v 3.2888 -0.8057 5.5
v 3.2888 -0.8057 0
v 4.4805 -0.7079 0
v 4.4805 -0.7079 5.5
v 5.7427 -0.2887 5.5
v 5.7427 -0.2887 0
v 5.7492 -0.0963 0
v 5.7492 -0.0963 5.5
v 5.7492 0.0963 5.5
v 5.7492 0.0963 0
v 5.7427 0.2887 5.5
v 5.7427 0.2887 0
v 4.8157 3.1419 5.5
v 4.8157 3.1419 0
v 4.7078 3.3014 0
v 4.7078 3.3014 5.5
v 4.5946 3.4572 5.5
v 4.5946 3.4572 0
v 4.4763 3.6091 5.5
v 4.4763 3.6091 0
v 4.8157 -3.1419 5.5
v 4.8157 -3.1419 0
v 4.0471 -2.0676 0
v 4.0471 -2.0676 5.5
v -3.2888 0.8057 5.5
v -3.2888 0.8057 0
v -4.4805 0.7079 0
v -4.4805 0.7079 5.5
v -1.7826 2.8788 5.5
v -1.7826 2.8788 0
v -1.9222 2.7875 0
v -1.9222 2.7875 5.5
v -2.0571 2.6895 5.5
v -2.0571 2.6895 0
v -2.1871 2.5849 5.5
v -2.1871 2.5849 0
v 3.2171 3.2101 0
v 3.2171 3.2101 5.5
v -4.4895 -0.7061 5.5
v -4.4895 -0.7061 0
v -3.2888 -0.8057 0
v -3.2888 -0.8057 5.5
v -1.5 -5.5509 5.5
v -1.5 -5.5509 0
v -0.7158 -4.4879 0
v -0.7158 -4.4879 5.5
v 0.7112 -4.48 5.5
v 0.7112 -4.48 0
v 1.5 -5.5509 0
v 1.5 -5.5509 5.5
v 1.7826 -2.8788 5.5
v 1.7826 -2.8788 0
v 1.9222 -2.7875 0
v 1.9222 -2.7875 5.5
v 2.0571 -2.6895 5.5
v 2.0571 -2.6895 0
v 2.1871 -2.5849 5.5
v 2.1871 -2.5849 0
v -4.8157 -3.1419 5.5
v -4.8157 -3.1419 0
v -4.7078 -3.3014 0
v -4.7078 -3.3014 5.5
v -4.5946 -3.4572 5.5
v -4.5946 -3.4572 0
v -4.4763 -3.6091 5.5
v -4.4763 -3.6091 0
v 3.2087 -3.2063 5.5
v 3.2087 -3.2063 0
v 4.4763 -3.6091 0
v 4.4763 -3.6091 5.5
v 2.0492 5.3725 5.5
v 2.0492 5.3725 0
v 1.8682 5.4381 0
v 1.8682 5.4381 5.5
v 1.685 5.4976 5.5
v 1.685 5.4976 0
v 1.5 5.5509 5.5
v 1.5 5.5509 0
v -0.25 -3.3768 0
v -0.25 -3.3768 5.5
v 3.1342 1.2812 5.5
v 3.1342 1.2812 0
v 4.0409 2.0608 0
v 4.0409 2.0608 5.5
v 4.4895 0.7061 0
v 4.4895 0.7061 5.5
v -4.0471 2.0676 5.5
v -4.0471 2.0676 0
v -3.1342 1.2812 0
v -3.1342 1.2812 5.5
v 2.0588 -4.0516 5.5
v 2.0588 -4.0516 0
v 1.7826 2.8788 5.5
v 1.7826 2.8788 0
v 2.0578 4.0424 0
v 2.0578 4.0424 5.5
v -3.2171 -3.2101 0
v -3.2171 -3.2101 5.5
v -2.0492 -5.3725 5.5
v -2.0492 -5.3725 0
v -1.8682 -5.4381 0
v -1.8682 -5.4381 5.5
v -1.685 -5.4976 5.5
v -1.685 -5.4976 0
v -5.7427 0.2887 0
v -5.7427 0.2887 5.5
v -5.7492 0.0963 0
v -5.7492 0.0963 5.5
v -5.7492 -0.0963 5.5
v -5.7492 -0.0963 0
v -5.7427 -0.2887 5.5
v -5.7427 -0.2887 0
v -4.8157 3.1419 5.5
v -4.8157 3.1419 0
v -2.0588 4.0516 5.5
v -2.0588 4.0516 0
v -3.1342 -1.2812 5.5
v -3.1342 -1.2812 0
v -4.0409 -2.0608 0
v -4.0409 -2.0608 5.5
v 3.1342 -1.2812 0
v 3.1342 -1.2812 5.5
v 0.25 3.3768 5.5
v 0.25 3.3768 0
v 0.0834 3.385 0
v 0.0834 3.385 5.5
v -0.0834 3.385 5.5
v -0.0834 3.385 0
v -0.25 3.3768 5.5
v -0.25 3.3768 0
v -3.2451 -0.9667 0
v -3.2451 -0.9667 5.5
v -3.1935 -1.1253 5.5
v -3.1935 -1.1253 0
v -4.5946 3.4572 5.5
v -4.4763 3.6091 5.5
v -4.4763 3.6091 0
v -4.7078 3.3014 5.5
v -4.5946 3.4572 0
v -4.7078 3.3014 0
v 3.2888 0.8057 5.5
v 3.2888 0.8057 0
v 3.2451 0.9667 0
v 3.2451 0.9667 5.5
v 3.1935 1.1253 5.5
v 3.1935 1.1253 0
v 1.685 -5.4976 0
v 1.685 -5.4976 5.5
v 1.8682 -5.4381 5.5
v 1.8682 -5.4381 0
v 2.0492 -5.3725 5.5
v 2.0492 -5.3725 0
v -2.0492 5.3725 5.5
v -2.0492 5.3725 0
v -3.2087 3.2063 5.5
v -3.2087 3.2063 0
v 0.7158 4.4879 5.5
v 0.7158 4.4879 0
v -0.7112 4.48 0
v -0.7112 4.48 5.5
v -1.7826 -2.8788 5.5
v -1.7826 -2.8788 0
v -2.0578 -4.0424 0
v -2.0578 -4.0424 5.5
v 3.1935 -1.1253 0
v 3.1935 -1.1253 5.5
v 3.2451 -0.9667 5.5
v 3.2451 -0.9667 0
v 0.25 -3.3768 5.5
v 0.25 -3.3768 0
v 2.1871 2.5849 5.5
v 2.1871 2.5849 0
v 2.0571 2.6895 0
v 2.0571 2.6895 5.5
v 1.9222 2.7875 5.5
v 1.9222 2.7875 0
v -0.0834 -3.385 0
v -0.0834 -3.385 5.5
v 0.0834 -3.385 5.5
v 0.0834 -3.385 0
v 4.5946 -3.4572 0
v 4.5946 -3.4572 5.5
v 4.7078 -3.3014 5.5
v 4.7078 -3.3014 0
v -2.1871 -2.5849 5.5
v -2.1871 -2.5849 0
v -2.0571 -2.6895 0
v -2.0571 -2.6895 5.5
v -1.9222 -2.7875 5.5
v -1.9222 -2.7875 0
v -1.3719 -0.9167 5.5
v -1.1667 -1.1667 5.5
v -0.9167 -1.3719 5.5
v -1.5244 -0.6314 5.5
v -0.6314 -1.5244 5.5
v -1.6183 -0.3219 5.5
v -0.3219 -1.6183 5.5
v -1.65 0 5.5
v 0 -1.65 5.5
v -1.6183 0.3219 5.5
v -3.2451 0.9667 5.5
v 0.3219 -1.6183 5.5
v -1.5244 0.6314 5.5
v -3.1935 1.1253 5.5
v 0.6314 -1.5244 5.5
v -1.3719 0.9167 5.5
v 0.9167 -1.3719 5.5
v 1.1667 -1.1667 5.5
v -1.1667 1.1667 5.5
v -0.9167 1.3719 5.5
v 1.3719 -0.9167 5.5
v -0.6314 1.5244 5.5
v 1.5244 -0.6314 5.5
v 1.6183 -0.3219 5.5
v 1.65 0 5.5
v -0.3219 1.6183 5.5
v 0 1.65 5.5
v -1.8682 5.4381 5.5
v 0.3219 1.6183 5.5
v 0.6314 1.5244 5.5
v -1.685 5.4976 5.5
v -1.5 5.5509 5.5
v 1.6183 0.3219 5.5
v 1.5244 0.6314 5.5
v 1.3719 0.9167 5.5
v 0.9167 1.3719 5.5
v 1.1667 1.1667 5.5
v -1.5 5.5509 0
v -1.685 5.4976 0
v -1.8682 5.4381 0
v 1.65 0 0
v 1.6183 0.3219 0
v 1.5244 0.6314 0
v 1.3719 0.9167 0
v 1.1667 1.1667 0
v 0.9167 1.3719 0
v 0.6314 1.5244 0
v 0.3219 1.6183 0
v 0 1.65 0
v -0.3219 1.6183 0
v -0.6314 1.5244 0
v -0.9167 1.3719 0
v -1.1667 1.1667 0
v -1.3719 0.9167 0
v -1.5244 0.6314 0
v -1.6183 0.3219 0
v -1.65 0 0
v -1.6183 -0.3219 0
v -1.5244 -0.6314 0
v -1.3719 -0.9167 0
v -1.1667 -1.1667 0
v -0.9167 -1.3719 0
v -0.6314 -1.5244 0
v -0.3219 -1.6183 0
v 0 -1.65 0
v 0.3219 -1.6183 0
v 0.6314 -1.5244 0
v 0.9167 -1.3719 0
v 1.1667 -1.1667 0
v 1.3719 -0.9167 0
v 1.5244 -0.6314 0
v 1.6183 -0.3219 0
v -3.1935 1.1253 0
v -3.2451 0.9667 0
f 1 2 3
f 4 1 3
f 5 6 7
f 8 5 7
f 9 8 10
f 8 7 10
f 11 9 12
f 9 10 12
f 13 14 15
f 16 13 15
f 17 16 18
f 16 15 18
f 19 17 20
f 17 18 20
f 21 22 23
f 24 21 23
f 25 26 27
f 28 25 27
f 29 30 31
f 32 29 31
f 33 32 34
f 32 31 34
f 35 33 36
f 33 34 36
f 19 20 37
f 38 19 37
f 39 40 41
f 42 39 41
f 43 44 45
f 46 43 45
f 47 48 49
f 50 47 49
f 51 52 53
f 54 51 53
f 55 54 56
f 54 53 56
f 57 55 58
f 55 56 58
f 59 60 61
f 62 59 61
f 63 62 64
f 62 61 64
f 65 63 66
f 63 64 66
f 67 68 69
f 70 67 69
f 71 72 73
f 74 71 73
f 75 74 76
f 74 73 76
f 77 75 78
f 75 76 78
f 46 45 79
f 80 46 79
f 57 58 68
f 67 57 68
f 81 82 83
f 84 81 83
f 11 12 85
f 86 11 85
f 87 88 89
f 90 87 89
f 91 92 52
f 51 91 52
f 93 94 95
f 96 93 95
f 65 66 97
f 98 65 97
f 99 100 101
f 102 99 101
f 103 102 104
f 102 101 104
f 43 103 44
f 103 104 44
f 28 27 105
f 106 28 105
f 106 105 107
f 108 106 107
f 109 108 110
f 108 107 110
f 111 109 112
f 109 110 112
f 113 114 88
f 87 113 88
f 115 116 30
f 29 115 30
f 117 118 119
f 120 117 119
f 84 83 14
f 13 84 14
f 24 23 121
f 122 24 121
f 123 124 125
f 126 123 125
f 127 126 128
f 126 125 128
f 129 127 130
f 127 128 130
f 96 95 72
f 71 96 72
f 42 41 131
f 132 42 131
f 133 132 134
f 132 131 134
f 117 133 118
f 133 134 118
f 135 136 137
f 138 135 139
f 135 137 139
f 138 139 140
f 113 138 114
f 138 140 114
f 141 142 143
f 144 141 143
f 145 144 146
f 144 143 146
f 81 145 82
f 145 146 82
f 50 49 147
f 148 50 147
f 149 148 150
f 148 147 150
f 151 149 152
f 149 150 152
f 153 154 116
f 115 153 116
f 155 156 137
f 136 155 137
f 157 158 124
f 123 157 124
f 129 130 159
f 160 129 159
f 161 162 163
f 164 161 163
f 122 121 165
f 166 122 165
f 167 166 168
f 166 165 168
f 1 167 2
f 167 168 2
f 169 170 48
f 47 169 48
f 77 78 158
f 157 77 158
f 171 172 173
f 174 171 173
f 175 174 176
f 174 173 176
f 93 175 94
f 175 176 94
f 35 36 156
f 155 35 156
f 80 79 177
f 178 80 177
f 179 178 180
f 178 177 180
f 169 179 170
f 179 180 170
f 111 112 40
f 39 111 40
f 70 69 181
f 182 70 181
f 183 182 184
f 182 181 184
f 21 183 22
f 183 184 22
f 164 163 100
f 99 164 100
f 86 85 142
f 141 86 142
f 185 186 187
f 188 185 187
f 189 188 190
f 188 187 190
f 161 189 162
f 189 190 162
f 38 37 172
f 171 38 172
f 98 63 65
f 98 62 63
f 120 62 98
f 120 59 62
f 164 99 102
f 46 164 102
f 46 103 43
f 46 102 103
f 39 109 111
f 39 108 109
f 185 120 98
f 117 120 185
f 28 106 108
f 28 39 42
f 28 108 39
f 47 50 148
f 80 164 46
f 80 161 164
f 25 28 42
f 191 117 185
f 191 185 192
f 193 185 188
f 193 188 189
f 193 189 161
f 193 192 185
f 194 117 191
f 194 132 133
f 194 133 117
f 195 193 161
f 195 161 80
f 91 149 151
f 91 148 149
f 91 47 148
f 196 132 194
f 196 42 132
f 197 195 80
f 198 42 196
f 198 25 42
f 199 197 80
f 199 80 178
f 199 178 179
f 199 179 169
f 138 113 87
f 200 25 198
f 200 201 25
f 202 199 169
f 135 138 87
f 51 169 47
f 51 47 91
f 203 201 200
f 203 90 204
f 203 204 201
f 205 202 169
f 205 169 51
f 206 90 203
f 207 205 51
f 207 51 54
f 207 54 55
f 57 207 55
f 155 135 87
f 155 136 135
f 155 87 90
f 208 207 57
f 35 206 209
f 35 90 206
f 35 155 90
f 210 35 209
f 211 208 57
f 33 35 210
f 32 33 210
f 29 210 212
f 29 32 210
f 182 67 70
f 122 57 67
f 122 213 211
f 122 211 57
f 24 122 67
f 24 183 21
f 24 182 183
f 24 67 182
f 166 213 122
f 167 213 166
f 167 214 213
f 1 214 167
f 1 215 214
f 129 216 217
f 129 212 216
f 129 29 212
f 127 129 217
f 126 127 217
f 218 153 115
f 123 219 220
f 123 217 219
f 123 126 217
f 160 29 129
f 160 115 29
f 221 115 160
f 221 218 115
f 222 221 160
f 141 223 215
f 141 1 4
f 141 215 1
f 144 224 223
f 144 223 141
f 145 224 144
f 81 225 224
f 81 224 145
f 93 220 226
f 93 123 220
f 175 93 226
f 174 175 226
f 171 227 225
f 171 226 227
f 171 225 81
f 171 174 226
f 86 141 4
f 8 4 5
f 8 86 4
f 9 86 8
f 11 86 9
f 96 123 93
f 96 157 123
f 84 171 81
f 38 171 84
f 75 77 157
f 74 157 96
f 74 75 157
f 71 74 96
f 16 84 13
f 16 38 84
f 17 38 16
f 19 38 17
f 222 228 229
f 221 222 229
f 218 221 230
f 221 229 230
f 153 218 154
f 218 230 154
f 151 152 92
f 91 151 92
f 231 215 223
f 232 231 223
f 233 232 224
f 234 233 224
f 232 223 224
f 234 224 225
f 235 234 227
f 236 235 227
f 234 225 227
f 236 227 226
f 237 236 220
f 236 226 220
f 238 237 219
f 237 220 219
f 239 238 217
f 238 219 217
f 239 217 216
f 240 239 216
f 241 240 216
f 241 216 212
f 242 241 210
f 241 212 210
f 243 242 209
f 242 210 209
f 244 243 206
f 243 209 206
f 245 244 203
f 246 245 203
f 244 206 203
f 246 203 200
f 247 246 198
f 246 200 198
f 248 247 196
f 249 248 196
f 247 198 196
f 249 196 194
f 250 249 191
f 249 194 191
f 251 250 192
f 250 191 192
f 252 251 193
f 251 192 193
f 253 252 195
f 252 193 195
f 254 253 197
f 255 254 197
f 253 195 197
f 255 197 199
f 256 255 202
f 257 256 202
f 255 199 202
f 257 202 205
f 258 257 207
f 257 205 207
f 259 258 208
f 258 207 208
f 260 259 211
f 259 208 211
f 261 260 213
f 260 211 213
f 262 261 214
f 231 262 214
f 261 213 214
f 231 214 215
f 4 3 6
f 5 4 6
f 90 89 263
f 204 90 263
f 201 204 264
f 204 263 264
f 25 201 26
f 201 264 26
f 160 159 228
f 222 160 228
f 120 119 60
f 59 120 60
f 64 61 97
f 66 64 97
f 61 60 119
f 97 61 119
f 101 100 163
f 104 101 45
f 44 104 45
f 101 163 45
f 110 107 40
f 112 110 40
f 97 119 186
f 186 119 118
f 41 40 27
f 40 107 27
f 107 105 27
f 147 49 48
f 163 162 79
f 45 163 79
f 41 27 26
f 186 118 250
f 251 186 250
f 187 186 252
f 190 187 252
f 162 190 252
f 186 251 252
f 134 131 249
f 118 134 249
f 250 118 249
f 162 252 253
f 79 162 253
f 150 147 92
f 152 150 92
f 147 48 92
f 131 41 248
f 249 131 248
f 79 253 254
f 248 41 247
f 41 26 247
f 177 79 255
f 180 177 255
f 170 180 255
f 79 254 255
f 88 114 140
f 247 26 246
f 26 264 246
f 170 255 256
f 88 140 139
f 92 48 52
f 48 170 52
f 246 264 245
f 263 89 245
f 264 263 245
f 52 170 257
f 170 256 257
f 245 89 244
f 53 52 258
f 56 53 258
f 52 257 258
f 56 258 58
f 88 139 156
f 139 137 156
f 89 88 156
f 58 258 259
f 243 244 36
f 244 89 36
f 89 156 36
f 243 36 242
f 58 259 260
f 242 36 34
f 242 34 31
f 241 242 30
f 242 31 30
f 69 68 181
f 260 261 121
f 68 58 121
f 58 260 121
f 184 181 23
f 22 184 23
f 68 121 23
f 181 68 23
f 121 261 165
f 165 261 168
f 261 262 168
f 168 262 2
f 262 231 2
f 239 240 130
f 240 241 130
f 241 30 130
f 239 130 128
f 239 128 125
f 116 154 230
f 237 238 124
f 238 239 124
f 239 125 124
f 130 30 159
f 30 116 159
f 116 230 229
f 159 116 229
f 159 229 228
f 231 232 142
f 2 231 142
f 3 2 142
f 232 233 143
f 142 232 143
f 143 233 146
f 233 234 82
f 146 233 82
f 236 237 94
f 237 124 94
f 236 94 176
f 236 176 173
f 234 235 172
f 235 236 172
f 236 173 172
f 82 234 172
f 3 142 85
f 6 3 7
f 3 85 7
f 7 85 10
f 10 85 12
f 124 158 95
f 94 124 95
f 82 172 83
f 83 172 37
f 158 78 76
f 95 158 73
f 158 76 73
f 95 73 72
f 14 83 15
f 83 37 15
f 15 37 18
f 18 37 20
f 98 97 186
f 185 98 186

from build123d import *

# Parameters (mm, degrees)
SKETCH1_R           = 5.75
BOSS_EXTRUDE1_DEPTH = 5.5
SKETCH2_R           = 1.65
CUT_EXTRUDE1_DEPTH  = 5.5
CUT_EXTRUDE3_START  = -5.5
CUT_EXTRUDE3_DEPTH  = 5.5
CIRPATTERN2_COUNT   = 10


with BuildPart() as part:
    # Sketch1 → Boss-Extrude1 (new body)
    with BuildSketch(Plane.XY):
        Circle(SKETCH1_R)
    extrude(amount=BOSS_EXTRUDE1_DEPTH)

    # Sketch2 → Cut-Extrude1 (cut)
    with BuildSketch(Plane.XY.offset(5.5)):
        Circle(SKETCH2_R)
    extrude(amount=-CUT_EXTRUDE1_DEPTH, mode=Mode.SUBTRACT)

    # Sketch5 → Cut-Extrude3 (cut)
    with BuildSketch(Plane.XY.offset(5.5).offset(CUT_EXTRUDE3_START)):
        with BuildLine():
            Line((-0.25, 3.376770386), (-0.711246658, 4.479961461))
            Line((-0.711246658, 4.479961461), (-1.5, 5.550900828))
            ThreePointArc((-1.5, 5.550900828), (0, 5.75), (1.5, 5.550900828))
            Line((1.5, 5.550900828), (0.715828266, 4.487930272))
            Line((0.715828266, 4.487930272), (0.25, 3.376770386))
            ThreePointArc((0.25, 3.376770386), (0, 3.386012144), (-0.25, 3.376770386))
        make_face()
    cut_extrude3 = extrude(amount=CUT_EXTRUDE3_DEPTH, mode=Mode.SUBTRACT)

    # CirPattern2: Cut-Extrude3 ×10 about axis
    cirpattern2_axis = Axis((0, 0, 0), (0, 0, 1))
    for i in range(1, CIRPATTERN2_COUNT):
        add(cut_extrude3.rotate(cirpattern2_axis, i * 360 / CIRPATTERN2_COUNT), mode=Mode.SUBTRACT)


solid = part.part
